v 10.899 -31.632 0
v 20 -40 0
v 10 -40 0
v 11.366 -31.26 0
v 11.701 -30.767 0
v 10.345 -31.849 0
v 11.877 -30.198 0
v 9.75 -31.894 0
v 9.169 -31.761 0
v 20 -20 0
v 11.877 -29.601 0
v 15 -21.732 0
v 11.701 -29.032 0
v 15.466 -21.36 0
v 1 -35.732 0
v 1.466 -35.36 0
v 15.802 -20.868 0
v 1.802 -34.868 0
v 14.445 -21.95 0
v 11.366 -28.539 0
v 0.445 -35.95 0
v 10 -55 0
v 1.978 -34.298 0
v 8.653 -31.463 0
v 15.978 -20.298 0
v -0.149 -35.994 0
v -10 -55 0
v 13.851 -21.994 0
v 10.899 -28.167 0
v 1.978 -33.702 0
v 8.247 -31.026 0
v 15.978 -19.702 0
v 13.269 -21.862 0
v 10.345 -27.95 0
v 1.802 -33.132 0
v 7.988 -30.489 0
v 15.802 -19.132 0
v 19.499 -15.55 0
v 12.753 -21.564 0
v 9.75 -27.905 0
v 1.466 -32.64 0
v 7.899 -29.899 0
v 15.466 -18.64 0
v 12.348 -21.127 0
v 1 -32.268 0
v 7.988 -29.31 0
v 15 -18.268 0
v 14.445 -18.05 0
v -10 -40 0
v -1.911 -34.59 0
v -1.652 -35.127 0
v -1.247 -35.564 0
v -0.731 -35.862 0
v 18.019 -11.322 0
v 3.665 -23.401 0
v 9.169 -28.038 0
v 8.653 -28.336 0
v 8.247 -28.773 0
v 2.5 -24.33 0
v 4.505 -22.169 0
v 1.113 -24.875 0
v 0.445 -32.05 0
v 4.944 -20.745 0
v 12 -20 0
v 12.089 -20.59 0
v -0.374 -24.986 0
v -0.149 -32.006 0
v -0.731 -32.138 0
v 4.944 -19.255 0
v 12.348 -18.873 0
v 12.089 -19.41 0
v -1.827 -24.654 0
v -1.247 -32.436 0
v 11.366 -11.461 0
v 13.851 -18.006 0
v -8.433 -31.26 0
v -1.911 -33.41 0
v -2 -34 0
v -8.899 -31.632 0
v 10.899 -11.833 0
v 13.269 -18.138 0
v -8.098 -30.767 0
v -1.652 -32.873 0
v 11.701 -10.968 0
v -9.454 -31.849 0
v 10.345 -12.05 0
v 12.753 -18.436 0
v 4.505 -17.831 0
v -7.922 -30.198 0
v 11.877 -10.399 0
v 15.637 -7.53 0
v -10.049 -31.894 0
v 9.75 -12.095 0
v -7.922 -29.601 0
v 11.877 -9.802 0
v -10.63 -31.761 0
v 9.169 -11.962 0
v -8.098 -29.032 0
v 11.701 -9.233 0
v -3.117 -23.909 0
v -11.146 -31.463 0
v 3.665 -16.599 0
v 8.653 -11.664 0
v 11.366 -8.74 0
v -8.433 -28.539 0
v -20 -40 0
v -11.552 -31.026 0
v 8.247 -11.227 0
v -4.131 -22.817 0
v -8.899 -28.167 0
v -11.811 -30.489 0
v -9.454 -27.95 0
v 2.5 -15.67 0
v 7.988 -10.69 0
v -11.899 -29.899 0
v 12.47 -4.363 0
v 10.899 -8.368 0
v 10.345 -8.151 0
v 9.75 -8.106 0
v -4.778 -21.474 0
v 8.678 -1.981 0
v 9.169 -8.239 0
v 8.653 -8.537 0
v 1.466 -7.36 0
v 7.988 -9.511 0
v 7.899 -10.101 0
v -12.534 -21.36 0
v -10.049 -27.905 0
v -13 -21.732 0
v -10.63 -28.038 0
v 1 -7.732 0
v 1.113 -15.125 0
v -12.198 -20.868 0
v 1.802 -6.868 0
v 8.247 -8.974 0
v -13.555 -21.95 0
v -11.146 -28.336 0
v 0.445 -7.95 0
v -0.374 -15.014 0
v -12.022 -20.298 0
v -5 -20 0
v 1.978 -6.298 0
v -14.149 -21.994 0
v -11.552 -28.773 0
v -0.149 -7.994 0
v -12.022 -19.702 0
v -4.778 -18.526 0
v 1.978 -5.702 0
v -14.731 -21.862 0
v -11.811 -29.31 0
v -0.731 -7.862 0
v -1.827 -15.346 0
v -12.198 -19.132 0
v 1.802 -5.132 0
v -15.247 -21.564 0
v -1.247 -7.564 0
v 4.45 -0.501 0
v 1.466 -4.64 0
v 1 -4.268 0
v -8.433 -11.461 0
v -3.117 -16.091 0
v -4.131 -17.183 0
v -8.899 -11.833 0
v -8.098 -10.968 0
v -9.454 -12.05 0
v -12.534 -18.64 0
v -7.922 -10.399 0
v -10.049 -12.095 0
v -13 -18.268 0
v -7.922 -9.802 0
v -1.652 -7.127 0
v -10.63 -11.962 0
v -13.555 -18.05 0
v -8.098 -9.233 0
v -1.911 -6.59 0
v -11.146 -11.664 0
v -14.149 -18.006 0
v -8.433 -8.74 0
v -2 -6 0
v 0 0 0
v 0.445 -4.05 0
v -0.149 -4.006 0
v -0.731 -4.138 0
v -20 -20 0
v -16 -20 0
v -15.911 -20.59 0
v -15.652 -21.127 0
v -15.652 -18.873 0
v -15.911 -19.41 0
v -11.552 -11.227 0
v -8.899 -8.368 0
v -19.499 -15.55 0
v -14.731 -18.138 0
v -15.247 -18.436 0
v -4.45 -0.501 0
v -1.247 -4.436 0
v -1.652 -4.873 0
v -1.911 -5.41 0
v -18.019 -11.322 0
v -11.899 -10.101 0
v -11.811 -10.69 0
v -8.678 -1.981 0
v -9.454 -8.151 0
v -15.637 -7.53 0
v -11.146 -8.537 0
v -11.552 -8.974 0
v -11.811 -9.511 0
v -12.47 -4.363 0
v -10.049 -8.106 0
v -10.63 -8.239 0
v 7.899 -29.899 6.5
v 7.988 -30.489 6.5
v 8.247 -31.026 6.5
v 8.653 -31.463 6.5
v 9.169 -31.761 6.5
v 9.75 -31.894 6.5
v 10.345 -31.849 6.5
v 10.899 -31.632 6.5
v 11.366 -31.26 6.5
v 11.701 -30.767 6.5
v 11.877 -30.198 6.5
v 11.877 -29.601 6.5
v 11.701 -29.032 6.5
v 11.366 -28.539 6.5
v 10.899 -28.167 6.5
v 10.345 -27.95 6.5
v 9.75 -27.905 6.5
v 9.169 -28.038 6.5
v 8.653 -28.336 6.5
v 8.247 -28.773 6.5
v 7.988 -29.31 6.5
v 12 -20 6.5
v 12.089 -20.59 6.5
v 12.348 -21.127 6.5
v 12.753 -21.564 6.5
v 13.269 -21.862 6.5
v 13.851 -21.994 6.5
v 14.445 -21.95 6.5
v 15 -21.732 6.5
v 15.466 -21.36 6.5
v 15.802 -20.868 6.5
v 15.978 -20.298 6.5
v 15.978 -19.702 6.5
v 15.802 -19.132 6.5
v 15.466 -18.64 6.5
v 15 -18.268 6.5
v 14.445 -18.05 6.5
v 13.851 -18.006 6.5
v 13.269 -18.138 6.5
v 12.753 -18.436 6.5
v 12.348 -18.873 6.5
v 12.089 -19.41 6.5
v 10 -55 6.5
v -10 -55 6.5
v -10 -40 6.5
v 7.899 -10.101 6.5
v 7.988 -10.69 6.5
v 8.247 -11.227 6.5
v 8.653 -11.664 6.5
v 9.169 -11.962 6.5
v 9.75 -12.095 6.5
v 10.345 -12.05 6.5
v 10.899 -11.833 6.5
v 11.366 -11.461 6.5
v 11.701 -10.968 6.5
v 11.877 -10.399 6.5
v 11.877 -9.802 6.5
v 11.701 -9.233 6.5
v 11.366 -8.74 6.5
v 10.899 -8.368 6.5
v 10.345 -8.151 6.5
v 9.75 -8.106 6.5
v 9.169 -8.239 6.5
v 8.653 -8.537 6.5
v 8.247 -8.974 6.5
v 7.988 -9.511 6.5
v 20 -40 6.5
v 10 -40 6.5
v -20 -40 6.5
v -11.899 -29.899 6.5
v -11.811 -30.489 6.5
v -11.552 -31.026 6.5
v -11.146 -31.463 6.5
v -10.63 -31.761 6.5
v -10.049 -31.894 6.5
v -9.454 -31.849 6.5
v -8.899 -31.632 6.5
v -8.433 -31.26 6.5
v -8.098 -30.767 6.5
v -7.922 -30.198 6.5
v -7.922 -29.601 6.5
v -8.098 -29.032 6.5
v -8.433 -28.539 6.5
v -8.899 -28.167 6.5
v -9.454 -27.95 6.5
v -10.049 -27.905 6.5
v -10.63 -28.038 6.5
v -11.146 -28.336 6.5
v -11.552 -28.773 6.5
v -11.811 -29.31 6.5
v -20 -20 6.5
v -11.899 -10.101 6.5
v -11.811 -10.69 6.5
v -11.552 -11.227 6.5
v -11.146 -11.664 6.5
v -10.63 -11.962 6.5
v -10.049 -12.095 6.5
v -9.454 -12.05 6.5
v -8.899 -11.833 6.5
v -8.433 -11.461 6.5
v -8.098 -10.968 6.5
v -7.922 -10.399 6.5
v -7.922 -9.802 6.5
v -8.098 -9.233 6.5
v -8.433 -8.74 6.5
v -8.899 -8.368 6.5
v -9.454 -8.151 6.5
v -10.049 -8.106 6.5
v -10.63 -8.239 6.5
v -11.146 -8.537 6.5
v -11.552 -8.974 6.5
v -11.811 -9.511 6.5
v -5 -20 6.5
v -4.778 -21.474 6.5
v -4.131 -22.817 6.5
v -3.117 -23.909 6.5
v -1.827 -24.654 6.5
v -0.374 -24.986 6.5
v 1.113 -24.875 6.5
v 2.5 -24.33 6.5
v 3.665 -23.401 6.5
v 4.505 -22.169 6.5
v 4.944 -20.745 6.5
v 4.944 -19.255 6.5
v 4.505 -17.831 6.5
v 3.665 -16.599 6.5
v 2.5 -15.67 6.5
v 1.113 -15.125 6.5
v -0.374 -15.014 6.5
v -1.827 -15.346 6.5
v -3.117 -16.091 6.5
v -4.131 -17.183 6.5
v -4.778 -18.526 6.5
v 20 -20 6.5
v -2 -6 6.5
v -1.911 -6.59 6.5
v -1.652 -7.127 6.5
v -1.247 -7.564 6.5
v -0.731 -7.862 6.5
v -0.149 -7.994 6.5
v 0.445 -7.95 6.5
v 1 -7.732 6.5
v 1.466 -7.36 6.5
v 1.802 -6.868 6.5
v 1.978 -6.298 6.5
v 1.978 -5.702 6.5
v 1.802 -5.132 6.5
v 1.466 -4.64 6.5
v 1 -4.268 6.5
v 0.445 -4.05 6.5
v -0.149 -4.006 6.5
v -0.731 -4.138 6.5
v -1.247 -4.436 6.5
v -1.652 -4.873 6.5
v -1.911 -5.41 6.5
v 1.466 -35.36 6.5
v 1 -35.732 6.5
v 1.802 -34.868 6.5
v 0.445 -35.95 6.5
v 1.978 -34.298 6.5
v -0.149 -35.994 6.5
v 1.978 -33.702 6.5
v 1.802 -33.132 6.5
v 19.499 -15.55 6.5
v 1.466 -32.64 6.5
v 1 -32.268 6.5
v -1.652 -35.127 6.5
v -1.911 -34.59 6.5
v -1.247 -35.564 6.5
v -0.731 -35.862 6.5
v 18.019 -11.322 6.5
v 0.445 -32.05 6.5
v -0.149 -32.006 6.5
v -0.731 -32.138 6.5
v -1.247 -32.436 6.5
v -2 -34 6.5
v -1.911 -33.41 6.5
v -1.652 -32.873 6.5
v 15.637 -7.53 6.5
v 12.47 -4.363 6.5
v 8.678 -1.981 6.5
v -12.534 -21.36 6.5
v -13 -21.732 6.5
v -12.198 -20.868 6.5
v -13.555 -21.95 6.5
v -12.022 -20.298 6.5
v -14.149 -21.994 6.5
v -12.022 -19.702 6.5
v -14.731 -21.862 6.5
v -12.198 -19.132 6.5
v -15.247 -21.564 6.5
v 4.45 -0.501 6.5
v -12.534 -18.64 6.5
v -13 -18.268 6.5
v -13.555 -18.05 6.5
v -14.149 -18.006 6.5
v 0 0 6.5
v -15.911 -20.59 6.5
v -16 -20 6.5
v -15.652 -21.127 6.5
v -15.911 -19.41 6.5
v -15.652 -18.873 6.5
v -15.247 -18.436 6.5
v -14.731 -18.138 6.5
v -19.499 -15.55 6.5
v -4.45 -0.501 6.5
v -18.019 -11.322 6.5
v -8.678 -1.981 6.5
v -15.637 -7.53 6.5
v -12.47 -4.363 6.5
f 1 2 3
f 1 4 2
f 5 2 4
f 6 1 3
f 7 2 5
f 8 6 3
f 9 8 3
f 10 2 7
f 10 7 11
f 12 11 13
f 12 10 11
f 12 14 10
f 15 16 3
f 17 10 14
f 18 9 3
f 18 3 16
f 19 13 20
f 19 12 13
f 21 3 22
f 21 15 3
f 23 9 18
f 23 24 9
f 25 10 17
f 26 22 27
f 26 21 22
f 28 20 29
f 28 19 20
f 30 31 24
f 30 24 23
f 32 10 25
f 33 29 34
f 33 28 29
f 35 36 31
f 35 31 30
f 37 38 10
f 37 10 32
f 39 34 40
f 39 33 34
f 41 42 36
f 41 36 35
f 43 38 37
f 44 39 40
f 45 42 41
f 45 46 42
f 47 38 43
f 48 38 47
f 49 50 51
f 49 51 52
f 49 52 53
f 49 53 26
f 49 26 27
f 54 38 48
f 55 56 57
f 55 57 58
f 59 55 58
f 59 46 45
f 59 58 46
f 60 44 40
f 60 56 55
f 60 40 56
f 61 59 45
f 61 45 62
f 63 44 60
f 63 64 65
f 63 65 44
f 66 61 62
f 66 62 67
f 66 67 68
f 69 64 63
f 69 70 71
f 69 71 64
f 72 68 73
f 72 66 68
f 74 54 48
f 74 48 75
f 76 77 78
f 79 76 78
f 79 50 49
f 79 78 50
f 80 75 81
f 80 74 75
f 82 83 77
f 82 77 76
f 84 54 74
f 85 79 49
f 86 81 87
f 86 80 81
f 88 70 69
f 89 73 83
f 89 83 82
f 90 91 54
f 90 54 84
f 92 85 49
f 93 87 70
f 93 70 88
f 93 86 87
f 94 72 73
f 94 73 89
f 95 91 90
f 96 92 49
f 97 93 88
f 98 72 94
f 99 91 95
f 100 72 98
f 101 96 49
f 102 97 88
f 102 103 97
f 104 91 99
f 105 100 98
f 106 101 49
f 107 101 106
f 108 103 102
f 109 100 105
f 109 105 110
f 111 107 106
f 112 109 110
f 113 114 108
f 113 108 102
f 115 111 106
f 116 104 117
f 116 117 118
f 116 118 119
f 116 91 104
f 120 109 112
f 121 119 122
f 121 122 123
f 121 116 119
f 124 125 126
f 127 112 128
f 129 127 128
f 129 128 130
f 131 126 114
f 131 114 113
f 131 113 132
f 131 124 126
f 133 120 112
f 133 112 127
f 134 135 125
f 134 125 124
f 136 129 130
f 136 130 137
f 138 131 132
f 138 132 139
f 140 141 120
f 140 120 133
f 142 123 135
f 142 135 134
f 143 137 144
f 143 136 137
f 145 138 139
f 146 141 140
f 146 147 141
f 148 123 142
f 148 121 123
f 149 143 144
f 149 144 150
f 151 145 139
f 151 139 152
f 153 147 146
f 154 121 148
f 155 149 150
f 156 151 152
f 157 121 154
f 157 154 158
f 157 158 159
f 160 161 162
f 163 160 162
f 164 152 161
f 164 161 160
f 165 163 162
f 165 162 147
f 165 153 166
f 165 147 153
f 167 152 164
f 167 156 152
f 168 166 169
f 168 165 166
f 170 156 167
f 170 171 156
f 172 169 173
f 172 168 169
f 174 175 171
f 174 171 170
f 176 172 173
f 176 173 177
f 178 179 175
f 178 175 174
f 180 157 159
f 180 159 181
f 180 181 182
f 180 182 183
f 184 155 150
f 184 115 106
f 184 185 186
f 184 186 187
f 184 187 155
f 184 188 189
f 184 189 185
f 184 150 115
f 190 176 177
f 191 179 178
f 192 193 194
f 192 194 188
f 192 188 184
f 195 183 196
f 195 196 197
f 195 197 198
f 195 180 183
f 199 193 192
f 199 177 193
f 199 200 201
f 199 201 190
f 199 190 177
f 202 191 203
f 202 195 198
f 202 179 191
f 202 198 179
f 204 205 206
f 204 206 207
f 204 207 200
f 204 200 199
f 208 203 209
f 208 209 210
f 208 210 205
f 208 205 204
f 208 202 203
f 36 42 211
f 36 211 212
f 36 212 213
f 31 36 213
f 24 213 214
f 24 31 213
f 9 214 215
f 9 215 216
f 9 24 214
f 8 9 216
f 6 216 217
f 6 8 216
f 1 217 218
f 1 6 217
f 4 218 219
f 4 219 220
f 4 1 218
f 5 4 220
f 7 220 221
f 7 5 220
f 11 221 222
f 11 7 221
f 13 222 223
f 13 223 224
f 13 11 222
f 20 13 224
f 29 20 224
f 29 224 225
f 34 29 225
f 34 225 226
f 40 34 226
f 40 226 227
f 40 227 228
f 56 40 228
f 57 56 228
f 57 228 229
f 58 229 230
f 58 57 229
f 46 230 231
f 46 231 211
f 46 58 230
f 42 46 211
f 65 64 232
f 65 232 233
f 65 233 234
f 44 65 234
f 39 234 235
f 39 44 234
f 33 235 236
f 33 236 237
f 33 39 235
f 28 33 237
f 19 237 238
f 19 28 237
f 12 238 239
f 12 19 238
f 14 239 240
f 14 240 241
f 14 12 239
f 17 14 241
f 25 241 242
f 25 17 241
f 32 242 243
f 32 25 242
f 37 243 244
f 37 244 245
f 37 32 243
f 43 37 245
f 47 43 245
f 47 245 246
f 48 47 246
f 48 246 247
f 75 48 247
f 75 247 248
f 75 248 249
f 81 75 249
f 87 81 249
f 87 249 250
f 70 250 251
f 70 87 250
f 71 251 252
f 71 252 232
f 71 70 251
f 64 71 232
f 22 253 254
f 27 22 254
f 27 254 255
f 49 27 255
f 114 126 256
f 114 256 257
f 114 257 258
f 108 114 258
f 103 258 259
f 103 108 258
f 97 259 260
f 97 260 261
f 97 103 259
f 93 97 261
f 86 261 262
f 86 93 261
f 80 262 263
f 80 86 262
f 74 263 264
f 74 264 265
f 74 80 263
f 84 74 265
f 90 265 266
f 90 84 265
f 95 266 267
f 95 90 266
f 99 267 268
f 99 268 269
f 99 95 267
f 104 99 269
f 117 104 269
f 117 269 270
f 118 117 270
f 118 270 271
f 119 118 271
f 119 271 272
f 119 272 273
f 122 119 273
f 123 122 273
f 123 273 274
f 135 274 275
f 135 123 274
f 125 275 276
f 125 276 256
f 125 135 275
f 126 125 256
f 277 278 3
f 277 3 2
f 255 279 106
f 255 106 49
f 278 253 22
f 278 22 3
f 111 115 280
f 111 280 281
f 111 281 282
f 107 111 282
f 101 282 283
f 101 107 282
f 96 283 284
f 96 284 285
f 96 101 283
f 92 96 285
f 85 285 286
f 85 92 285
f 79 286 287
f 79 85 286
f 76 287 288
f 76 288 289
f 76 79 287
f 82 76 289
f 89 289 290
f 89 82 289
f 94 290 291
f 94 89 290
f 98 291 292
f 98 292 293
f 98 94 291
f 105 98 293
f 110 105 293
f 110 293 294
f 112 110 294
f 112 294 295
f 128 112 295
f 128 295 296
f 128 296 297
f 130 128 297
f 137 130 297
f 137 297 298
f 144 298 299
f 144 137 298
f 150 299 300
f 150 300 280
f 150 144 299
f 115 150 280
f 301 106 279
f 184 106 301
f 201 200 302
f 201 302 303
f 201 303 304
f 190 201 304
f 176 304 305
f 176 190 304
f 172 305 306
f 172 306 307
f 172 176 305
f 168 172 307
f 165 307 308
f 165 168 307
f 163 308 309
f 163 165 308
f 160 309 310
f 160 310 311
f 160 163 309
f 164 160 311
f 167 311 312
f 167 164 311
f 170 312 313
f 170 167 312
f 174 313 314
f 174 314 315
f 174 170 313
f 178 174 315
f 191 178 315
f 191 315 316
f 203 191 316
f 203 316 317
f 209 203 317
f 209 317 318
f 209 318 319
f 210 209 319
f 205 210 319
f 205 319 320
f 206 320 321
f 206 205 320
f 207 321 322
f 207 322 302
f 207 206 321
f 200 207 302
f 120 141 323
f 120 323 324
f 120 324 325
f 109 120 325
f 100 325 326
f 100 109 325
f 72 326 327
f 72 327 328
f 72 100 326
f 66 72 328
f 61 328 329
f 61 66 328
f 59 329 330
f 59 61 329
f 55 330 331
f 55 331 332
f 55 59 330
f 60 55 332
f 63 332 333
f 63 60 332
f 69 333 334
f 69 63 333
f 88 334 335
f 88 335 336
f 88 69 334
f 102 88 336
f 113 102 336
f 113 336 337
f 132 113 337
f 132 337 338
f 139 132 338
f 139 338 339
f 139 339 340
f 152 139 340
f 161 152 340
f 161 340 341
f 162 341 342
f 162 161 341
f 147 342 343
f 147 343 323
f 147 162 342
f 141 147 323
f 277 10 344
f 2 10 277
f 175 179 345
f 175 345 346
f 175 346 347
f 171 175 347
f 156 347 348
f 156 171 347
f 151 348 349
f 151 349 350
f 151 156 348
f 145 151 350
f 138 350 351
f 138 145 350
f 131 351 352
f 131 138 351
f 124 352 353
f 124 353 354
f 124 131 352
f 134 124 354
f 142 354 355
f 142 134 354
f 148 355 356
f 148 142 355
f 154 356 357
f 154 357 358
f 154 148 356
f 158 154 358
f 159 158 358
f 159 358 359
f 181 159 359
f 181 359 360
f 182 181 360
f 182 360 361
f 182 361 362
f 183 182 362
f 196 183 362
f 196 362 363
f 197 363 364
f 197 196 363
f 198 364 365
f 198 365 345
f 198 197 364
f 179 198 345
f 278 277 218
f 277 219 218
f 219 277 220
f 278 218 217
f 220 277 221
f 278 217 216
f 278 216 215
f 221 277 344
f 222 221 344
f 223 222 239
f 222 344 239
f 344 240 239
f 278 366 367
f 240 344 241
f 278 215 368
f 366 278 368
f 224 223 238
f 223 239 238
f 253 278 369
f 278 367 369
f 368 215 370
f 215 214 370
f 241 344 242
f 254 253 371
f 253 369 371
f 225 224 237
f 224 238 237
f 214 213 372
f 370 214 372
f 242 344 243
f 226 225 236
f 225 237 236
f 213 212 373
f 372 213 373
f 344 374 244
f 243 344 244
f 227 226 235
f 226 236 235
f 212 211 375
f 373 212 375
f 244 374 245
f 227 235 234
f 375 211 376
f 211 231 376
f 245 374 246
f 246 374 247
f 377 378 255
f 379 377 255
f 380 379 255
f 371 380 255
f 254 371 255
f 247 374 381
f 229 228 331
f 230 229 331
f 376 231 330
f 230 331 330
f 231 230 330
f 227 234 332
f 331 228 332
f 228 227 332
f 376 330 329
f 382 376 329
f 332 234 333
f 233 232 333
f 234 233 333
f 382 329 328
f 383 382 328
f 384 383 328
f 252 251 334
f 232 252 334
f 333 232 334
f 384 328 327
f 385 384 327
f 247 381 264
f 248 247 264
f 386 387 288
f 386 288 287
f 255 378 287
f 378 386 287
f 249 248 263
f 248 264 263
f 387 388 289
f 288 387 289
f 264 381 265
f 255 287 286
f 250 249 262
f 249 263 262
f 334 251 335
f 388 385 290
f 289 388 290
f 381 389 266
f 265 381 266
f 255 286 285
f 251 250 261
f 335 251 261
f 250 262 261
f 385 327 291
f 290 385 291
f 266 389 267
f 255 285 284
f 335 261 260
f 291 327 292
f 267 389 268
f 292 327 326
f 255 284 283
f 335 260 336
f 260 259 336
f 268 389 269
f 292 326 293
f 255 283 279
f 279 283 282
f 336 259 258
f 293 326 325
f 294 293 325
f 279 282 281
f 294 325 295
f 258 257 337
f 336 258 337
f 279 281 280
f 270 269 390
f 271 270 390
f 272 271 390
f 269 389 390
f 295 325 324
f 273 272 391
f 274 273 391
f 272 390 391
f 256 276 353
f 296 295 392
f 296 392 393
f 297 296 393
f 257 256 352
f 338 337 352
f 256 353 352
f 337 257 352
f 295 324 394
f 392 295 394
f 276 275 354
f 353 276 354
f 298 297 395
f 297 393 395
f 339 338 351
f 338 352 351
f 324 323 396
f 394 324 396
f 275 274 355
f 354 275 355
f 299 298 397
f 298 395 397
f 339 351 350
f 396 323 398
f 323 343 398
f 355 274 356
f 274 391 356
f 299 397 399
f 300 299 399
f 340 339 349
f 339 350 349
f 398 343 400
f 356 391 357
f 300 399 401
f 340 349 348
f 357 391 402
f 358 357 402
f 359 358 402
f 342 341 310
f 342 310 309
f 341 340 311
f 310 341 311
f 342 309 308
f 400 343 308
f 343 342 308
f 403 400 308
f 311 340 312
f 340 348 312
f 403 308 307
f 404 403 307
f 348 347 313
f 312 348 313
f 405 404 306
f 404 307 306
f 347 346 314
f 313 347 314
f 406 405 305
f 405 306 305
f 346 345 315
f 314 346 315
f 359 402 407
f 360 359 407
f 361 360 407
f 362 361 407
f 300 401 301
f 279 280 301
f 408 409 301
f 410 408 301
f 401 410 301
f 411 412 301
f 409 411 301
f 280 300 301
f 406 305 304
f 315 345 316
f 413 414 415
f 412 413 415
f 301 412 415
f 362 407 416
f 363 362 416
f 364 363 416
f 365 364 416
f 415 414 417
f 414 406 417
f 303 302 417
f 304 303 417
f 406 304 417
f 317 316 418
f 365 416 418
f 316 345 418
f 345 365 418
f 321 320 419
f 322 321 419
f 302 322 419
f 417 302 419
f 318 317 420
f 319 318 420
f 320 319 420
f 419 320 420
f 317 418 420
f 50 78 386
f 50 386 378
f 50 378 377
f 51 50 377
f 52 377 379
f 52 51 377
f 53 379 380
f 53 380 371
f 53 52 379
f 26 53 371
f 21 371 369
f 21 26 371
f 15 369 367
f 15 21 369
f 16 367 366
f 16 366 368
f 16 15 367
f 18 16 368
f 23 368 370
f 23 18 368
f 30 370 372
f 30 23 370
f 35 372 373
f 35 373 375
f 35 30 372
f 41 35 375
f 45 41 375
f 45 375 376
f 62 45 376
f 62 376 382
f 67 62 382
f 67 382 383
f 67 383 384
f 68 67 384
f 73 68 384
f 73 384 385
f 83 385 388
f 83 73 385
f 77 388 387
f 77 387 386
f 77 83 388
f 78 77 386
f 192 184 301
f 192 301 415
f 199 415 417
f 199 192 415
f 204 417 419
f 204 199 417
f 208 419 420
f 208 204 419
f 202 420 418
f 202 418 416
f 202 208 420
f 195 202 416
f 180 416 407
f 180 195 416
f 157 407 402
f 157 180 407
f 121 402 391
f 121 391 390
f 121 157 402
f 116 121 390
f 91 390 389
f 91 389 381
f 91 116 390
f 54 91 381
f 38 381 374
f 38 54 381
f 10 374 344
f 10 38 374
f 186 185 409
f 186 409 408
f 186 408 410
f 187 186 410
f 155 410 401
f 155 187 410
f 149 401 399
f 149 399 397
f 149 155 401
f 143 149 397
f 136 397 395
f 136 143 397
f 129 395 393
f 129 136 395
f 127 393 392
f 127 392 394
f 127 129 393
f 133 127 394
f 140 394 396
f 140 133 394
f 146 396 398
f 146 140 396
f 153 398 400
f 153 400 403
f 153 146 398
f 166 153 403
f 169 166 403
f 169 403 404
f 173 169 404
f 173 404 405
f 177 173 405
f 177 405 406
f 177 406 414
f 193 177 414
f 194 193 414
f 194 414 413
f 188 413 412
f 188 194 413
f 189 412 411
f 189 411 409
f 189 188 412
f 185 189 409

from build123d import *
from build123d.topology import SkipClean

# Parameters (mm, degrees)
ESQUISSE1_R           = 15
ESQUISSE1_R_2         = 5
ESQUISSE1_R_3         = 2
EXTRUSION1_DEPTH      = 6.5
ESQUISSE2_R           = 9
ESQUISSE2_R_2         = 1.5
EXTRUSION2_DEPTH      = 30
ESQUISSE3_R           = 15
EXTRUSION3_DEPTH      = 27
EXTRUSION4_DEPTH      = 104.717163478
EXTRUSION4_DEPTH_BACK = 104.717163478
EXTRUSION5_DEPTH      = 104.717163478
ESQUISSE6_W           = 10
ESQUISSE6_H           = 15
EXTRUSION6_DEPTH      = 59.883359279


with BuildPart() as part:
    # Esquisse1 → Extrusion1 (new body)
    with BuildSketch(Plane.XY):
        with BuildLine():
            Line((20, -20), (20, -75))
            ThreePointArc((20, -75), (0, -95), (-20, -75))
            Line((-20, -75), (-20, -20))
            ThreePointArc((-20, -20), (0, 0), (20, -20))
        make_face()
        with Locations(Location((0, -75, 0), (0, 0, 180))):
            Circle(ESQUISSE1_R, mode=Mode.SUBTRACT)
        with Locations(Location((0, -20, 0), (0, 0, 180))):
            Circle(ESQUISSE1_R_2, mode=Mode.SUBTRACT)
        with Locations(Location((-14, -20, 0), (0, 0, 180))):
            Circle(ESQUISSE1_R_3, mode=Mode.SUBTRACT)
        with Locations(Location((-9.899494937, -10.100505063, 0), (0, 0, 180))):
            Circle(ESQUISSE1_R_3, mode=Mode.SUBTRACT)
        with Locations(Location((0, -6, 0), (0, 0, 180))):
            Circle(ESQUISSE1_R_3, mode=Mode.SUBTRACT)
        with Locations(Location((9.899494937, -10.100505063, 0), (0, 0, 180))):
            Circle(ESQUISSE1_R_3, mode=Mode.SUBTRACT)
        with Locations(Location((14, -20, 0), (0, 0, 180))):
            Circle(ESQUISSE1_R_3, mode=Mode.SUBTRACT)
        with Locations(Location((9.899494937, -29.899494937, 0), (0, 0, 180))):
            Circle(ESQUISSE1_R_3, mode=Mode.SUBTRACT)
        with Locations(Location((0, -34, 0), (0, 0, 180))):
            Circle(ESQUISSE1_R_3, mode=Mode.SUBTRACT)
        with Locations(Location((-9.899494937, -29.899494937, 0), (0, 0, 180))):
            Circle(ESQUISSE1_R_3, mode=Mode.SUBTRACT)
    extrude(amount=EXTRUSION1_DEPTH)

    # Esquisse2 → Extrusion2 (add)
    with SkipClean():  # the faces are left unmerged after this step: merging them gives an invalid solid
        with BuildSketch(Plane.XY.offset(6.5)):
            with BuildLine():
                Line((12, -59), (-12, -59))
                ThreePointArc((-12, -59), (0, -95), (12, -59))
            make_face()
            with Locations((0, -75)):
                Circle(ESQUISSE2_R, mode=Mode.SUBTRACT)
            with Locations((0, -62)):
                Circle(ESQUISSE2_R_2, mode=Mode.SUBTRACT)
            with Locations((0, -88)):
                Circle(ESQUISSE2_R_2, mode=Mode.SUBTRACT)
            with Locations((-13, -75)):
                Circle(ESQUISSE2_R_2, mode=Mode.SUBTRACT)
            with Locations((13, -75)):
                Circle(ESQUISSE2_R_2, mode=Mode.SUBTRACT)
        extrude(amount=EXTRUSION2_DEPTH)

    # Esquisse3 → Extrusion3 (cut)
    with SkipClean():  # the faces are left unmerged after this step: merging them gives an invalid solid
        with BuildSketch(Plane(origin=(0, 0, 6.5), x_dir=(-1, 0, 0), z_dir=(0, 0, -1))):
            with Locations((0, -75)):
                Circle(ESQUISSE3_R)
        extrude(amount=-EXTRUSION3_DEPTH, mode=Mode.SUBTRACT)

    # Esquisse4 → Extrusion4 (cut, two sides: drawn at the far end of the back side and taken through both)
    with SkipClean():  # the faces are left unmerged after this step: merging them gives an invalid solid
        with BuildSketch(Plane(origin=(0, 0, 0), x_dir=(0, 0, -1), z_dir=(1, 0, 0)).offset(-EXTRUSION4_DEPTH_BACK)):
            Polygon((-36.5, -95), (-30, -95), (-36.5, -90), align=None)
        extrude(amount=EXTRUSION4_DEPTH + EXTRUSION4_DEPTH_BACK, mode=Mode.SUBTRACT)

    # Esquisse5 → Extrusion5 (cut, through all)
    with BuildSketch(Plane.XY.offset(36.5)):
        with BuildLine():
            Line((20, -55), (-20, -55))
            Line((-20, -55), (-20, -75))
            ThreePointArc((-20, -75), (0, -95), (20, -75))
            Line((20, -75), (20, -55))
        make_face()
    extrude(amount=-EXTRUSION5_DEPTH, mode=Mode.SUBTRACT)

    # Esquisse6 → Extrusion6 (cut, through all)
    with BuildSketch(Plane.XY.offset(6.5)):
        with Locations((-15, -47.5)):
            Rectangle(ESQUISSE6_W, ESQUISSE6_H)
        with Locations((15, -47.5)):
            Rectangle(ESQUISSE6_W, ESQUISSE6_H)
    extrude(amount=-EXTRUSION6_DEPTH, mode=Mode.SUBTRACT)


solid = part.part
